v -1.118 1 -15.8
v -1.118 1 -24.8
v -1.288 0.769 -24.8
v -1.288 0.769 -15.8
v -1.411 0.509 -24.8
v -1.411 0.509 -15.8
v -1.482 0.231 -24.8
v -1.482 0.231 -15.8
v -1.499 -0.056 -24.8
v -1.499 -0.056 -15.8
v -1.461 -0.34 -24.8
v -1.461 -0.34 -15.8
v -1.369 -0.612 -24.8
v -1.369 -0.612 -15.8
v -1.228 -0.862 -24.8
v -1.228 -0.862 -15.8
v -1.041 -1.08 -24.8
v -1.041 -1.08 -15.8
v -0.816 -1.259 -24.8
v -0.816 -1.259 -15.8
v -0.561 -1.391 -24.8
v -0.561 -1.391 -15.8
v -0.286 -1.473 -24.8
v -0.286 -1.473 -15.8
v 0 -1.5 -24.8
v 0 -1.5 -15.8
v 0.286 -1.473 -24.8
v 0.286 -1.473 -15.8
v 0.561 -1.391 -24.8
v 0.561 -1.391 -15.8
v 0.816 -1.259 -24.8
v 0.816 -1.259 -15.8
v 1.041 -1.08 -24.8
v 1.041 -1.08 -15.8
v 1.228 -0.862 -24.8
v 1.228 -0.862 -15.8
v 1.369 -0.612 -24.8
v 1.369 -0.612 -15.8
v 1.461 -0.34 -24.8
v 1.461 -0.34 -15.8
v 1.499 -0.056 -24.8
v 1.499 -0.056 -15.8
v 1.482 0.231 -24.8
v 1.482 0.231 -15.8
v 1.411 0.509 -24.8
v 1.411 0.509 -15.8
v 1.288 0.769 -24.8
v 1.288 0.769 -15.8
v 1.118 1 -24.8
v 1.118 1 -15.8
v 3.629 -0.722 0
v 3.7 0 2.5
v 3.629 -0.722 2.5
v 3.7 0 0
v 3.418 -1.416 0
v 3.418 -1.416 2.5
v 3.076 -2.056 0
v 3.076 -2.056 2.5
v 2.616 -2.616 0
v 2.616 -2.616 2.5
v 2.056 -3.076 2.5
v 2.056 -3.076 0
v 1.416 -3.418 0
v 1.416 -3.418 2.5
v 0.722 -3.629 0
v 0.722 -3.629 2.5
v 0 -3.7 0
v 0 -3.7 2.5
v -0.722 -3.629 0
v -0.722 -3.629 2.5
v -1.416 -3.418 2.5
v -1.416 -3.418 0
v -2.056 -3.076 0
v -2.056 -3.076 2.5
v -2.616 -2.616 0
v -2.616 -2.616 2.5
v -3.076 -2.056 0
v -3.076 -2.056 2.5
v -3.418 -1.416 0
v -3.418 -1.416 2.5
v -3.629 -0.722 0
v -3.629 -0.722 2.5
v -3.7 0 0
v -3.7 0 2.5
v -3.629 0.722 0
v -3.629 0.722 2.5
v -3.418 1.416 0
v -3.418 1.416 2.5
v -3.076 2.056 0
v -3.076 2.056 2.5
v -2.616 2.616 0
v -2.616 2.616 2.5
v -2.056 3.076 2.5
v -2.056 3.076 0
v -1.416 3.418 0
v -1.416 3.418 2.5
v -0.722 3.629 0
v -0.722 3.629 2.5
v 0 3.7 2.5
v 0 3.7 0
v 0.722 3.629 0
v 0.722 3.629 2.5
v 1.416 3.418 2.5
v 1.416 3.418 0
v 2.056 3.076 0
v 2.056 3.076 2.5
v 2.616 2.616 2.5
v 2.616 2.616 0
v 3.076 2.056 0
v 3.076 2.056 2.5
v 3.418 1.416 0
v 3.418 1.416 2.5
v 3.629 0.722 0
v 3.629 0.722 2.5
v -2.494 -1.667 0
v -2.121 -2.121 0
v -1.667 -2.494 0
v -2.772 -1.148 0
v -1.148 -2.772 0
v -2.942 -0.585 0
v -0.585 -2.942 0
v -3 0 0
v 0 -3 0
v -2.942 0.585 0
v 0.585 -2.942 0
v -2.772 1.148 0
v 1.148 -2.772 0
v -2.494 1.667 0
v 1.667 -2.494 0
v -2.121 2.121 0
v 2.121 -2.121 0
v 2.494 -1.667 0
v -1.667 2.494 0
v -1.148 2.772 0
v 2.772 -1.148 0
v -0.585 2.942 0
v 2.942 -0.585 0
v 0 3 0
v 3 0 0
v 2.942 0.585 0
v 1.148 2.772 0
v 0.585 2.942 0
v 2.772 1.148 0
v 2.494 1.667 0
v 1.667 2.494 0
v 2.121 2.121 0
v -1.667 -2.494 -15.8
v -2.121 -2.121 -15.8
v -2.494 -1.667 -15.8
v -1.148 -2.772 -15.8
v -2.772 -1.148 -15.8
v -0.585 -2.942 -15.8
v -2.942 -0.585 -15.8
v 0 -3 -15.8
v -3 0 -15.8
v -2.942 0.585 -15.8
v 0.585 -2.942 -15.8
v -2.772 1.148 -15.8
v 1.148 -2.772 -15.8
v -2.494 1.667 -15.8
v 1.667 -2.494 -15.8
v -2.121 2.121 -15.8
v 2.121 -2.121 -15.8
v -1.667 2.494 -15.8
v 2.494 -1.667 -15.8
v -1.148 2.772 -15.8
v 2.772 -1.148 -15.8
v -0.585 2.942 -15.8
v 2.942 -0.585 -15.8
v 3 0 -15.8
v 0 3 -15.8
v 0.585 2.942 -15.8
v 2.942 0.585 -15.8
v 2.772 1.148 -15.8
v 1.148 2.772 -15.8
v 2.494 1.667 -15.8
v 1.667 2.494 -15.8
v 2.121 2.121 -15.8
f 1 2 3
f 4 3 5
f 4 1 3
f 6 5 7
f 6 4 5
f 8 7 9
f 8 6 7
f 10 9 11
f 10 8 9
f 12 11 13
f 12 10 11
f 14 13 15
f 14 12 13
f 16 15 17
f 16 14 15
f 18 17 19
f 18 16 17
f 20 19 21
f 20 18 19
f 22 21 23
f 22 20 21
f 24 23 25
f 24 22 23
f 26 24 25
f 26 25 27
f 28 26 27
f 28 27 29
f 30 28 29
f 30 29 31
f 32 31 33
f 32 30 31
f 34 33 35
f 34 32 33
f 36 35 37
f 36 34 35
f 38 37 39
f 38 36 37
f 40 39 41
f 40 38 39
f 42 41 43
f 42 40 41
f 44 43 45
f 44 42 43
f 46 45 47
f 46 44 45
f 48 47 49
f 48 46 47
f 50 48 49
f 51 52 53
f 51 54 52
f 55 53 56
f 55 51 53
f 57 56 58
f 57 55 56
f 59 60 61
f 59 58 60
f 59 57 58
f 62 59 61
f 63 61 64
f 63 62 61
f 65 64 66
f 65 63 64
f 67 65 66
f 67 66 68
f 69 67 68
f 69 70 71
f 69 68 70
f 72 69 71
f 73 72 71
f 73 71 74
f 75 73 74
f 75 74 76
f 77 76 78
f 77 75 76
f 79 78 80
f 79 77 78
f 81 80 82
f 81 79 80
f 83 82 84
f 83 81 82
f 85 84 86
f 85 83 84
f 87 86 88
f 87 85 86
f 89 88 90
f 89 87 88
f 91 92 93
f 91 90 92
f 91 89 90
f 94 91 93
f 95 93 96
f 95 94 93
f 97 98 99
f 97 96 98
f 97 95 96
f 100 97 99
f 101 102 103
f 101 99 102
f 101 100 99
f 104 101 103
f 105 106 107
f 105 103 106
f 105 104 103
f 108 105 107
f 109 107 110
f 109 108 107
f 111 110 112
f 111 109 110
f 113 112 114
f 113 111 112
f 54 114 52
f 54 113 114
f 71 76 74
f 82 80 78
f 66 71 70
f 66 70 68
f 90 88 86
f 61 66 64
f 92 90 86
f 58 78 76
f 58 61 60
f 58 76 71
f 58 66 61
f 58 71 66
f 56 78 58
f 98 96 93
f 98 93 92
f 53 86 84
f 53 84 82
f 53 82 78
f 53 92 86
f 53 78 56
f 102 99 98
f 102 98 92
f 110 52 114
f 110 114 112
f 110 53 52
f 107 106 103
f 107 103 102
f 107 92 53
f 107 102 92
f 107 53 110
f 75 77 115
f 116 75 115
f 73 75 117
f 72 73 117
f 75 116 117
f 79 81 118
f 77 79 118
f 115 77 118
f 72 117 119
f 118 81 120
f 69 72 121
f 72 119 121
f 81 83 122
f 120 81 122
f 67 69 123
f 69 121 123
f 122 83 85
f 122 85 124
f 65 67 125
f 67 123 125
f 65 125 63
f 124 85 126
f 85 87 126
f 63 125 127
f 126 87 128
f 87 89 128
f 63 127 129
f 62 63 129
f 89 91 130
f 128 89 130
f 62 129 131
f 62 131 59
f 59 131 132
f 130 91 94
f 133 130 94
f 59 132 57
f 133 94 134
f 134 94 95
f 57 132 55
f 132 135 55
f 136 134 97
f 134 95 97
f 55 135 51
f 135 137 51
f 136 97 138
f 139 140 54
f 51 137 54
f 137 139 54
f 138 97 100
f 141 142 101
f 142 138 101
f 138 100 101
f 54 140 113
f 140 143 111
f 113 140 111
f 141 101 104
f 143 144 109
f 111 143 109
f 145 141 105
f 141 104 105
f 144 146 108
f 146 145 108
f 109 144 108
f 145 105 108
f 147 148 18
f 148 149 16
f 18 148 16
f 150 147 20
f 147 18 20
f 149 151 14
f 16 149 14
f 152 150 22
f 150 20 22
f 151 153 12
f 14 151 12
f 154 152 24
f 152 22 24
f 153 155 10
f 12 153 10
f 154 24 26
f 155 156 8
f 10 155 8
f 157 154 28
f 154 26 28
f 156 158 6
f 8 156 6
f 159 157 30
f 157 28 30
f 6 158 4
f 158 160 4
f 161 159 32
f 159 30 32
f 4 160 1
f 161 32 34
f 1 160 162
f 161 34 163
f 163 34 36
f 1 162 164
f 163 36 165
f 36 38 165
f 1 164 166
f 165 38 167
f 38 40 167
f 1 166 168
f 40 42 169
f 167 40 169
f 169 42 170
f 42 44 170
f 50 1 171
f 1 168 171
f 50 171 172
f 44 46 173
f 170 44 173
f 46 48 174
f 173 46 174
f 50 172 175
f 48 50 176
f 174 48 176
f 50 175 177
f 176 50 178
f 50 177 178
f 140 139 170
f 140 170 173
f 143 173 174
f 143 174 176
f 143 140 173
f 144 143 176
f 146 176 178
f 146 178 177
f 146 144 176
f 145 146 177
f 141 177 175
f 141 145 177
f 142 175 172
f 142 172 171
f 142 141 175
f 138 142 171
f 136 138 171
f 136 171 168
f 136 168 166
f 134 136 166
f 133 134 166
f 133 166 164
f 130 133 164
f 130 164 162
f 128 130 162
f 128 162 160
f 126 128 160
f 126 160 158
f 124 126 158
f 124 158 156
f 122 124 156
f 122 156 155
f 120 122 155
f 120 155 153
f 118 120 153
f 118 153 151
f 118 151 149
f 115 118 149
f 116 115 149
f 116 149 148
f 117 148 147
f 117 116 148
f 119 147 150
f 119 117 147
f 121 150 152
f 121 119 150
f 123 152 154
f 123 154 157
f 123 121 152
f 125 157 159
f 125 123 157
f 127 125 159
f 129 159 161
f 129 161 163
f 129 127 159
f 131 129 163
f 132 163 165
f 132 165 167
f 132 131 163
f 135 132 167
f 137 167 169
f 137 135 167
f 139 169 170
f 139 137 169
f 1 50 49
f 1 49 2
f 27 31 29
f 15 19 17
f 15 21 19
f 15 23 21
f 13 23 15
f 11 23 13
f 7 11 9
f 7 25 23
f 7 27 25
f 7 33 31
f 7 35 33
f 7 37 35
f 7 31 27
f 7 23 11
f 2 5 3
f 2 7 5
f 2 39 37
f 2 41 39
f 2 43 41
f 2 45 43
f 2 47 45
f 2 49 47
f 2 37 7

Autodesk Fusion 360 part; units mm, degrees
sketch "Sketch1" plane through (0, 0, 0) normal (0, 0, 1) x (1, 0, 0)
  circle A0 centre (0, 0) radius 3
  circle A1 centre (0, 0) radius 3.7
  dimension "d1" = 6
  dimension "d2" = 7.4
extrude "Extrude1" add sketch "Sketch1" along normal blind 2.5 contours A0 | A1
extrude "Extrude2" add sketch "Sketch1" against normal blind 15.8 contours A0
sketch "Sketch2" plane through (0, 0, -15.8) normal (0, 0, -1) x (-1, 0, 0)
  circle A0 centre (0, 0) radius 3
  circle A1 centre (0, 0) radius 1.5
  line L0 (-2.2147, 1) -> (2, 1)
  dimension "d7" = 3
  dimension "d8" = 1
extrude "Extrude3" add sketch "Sketch2" along normal blind 9 contours A1 L0 picked at (0.3583, 0.0454)
